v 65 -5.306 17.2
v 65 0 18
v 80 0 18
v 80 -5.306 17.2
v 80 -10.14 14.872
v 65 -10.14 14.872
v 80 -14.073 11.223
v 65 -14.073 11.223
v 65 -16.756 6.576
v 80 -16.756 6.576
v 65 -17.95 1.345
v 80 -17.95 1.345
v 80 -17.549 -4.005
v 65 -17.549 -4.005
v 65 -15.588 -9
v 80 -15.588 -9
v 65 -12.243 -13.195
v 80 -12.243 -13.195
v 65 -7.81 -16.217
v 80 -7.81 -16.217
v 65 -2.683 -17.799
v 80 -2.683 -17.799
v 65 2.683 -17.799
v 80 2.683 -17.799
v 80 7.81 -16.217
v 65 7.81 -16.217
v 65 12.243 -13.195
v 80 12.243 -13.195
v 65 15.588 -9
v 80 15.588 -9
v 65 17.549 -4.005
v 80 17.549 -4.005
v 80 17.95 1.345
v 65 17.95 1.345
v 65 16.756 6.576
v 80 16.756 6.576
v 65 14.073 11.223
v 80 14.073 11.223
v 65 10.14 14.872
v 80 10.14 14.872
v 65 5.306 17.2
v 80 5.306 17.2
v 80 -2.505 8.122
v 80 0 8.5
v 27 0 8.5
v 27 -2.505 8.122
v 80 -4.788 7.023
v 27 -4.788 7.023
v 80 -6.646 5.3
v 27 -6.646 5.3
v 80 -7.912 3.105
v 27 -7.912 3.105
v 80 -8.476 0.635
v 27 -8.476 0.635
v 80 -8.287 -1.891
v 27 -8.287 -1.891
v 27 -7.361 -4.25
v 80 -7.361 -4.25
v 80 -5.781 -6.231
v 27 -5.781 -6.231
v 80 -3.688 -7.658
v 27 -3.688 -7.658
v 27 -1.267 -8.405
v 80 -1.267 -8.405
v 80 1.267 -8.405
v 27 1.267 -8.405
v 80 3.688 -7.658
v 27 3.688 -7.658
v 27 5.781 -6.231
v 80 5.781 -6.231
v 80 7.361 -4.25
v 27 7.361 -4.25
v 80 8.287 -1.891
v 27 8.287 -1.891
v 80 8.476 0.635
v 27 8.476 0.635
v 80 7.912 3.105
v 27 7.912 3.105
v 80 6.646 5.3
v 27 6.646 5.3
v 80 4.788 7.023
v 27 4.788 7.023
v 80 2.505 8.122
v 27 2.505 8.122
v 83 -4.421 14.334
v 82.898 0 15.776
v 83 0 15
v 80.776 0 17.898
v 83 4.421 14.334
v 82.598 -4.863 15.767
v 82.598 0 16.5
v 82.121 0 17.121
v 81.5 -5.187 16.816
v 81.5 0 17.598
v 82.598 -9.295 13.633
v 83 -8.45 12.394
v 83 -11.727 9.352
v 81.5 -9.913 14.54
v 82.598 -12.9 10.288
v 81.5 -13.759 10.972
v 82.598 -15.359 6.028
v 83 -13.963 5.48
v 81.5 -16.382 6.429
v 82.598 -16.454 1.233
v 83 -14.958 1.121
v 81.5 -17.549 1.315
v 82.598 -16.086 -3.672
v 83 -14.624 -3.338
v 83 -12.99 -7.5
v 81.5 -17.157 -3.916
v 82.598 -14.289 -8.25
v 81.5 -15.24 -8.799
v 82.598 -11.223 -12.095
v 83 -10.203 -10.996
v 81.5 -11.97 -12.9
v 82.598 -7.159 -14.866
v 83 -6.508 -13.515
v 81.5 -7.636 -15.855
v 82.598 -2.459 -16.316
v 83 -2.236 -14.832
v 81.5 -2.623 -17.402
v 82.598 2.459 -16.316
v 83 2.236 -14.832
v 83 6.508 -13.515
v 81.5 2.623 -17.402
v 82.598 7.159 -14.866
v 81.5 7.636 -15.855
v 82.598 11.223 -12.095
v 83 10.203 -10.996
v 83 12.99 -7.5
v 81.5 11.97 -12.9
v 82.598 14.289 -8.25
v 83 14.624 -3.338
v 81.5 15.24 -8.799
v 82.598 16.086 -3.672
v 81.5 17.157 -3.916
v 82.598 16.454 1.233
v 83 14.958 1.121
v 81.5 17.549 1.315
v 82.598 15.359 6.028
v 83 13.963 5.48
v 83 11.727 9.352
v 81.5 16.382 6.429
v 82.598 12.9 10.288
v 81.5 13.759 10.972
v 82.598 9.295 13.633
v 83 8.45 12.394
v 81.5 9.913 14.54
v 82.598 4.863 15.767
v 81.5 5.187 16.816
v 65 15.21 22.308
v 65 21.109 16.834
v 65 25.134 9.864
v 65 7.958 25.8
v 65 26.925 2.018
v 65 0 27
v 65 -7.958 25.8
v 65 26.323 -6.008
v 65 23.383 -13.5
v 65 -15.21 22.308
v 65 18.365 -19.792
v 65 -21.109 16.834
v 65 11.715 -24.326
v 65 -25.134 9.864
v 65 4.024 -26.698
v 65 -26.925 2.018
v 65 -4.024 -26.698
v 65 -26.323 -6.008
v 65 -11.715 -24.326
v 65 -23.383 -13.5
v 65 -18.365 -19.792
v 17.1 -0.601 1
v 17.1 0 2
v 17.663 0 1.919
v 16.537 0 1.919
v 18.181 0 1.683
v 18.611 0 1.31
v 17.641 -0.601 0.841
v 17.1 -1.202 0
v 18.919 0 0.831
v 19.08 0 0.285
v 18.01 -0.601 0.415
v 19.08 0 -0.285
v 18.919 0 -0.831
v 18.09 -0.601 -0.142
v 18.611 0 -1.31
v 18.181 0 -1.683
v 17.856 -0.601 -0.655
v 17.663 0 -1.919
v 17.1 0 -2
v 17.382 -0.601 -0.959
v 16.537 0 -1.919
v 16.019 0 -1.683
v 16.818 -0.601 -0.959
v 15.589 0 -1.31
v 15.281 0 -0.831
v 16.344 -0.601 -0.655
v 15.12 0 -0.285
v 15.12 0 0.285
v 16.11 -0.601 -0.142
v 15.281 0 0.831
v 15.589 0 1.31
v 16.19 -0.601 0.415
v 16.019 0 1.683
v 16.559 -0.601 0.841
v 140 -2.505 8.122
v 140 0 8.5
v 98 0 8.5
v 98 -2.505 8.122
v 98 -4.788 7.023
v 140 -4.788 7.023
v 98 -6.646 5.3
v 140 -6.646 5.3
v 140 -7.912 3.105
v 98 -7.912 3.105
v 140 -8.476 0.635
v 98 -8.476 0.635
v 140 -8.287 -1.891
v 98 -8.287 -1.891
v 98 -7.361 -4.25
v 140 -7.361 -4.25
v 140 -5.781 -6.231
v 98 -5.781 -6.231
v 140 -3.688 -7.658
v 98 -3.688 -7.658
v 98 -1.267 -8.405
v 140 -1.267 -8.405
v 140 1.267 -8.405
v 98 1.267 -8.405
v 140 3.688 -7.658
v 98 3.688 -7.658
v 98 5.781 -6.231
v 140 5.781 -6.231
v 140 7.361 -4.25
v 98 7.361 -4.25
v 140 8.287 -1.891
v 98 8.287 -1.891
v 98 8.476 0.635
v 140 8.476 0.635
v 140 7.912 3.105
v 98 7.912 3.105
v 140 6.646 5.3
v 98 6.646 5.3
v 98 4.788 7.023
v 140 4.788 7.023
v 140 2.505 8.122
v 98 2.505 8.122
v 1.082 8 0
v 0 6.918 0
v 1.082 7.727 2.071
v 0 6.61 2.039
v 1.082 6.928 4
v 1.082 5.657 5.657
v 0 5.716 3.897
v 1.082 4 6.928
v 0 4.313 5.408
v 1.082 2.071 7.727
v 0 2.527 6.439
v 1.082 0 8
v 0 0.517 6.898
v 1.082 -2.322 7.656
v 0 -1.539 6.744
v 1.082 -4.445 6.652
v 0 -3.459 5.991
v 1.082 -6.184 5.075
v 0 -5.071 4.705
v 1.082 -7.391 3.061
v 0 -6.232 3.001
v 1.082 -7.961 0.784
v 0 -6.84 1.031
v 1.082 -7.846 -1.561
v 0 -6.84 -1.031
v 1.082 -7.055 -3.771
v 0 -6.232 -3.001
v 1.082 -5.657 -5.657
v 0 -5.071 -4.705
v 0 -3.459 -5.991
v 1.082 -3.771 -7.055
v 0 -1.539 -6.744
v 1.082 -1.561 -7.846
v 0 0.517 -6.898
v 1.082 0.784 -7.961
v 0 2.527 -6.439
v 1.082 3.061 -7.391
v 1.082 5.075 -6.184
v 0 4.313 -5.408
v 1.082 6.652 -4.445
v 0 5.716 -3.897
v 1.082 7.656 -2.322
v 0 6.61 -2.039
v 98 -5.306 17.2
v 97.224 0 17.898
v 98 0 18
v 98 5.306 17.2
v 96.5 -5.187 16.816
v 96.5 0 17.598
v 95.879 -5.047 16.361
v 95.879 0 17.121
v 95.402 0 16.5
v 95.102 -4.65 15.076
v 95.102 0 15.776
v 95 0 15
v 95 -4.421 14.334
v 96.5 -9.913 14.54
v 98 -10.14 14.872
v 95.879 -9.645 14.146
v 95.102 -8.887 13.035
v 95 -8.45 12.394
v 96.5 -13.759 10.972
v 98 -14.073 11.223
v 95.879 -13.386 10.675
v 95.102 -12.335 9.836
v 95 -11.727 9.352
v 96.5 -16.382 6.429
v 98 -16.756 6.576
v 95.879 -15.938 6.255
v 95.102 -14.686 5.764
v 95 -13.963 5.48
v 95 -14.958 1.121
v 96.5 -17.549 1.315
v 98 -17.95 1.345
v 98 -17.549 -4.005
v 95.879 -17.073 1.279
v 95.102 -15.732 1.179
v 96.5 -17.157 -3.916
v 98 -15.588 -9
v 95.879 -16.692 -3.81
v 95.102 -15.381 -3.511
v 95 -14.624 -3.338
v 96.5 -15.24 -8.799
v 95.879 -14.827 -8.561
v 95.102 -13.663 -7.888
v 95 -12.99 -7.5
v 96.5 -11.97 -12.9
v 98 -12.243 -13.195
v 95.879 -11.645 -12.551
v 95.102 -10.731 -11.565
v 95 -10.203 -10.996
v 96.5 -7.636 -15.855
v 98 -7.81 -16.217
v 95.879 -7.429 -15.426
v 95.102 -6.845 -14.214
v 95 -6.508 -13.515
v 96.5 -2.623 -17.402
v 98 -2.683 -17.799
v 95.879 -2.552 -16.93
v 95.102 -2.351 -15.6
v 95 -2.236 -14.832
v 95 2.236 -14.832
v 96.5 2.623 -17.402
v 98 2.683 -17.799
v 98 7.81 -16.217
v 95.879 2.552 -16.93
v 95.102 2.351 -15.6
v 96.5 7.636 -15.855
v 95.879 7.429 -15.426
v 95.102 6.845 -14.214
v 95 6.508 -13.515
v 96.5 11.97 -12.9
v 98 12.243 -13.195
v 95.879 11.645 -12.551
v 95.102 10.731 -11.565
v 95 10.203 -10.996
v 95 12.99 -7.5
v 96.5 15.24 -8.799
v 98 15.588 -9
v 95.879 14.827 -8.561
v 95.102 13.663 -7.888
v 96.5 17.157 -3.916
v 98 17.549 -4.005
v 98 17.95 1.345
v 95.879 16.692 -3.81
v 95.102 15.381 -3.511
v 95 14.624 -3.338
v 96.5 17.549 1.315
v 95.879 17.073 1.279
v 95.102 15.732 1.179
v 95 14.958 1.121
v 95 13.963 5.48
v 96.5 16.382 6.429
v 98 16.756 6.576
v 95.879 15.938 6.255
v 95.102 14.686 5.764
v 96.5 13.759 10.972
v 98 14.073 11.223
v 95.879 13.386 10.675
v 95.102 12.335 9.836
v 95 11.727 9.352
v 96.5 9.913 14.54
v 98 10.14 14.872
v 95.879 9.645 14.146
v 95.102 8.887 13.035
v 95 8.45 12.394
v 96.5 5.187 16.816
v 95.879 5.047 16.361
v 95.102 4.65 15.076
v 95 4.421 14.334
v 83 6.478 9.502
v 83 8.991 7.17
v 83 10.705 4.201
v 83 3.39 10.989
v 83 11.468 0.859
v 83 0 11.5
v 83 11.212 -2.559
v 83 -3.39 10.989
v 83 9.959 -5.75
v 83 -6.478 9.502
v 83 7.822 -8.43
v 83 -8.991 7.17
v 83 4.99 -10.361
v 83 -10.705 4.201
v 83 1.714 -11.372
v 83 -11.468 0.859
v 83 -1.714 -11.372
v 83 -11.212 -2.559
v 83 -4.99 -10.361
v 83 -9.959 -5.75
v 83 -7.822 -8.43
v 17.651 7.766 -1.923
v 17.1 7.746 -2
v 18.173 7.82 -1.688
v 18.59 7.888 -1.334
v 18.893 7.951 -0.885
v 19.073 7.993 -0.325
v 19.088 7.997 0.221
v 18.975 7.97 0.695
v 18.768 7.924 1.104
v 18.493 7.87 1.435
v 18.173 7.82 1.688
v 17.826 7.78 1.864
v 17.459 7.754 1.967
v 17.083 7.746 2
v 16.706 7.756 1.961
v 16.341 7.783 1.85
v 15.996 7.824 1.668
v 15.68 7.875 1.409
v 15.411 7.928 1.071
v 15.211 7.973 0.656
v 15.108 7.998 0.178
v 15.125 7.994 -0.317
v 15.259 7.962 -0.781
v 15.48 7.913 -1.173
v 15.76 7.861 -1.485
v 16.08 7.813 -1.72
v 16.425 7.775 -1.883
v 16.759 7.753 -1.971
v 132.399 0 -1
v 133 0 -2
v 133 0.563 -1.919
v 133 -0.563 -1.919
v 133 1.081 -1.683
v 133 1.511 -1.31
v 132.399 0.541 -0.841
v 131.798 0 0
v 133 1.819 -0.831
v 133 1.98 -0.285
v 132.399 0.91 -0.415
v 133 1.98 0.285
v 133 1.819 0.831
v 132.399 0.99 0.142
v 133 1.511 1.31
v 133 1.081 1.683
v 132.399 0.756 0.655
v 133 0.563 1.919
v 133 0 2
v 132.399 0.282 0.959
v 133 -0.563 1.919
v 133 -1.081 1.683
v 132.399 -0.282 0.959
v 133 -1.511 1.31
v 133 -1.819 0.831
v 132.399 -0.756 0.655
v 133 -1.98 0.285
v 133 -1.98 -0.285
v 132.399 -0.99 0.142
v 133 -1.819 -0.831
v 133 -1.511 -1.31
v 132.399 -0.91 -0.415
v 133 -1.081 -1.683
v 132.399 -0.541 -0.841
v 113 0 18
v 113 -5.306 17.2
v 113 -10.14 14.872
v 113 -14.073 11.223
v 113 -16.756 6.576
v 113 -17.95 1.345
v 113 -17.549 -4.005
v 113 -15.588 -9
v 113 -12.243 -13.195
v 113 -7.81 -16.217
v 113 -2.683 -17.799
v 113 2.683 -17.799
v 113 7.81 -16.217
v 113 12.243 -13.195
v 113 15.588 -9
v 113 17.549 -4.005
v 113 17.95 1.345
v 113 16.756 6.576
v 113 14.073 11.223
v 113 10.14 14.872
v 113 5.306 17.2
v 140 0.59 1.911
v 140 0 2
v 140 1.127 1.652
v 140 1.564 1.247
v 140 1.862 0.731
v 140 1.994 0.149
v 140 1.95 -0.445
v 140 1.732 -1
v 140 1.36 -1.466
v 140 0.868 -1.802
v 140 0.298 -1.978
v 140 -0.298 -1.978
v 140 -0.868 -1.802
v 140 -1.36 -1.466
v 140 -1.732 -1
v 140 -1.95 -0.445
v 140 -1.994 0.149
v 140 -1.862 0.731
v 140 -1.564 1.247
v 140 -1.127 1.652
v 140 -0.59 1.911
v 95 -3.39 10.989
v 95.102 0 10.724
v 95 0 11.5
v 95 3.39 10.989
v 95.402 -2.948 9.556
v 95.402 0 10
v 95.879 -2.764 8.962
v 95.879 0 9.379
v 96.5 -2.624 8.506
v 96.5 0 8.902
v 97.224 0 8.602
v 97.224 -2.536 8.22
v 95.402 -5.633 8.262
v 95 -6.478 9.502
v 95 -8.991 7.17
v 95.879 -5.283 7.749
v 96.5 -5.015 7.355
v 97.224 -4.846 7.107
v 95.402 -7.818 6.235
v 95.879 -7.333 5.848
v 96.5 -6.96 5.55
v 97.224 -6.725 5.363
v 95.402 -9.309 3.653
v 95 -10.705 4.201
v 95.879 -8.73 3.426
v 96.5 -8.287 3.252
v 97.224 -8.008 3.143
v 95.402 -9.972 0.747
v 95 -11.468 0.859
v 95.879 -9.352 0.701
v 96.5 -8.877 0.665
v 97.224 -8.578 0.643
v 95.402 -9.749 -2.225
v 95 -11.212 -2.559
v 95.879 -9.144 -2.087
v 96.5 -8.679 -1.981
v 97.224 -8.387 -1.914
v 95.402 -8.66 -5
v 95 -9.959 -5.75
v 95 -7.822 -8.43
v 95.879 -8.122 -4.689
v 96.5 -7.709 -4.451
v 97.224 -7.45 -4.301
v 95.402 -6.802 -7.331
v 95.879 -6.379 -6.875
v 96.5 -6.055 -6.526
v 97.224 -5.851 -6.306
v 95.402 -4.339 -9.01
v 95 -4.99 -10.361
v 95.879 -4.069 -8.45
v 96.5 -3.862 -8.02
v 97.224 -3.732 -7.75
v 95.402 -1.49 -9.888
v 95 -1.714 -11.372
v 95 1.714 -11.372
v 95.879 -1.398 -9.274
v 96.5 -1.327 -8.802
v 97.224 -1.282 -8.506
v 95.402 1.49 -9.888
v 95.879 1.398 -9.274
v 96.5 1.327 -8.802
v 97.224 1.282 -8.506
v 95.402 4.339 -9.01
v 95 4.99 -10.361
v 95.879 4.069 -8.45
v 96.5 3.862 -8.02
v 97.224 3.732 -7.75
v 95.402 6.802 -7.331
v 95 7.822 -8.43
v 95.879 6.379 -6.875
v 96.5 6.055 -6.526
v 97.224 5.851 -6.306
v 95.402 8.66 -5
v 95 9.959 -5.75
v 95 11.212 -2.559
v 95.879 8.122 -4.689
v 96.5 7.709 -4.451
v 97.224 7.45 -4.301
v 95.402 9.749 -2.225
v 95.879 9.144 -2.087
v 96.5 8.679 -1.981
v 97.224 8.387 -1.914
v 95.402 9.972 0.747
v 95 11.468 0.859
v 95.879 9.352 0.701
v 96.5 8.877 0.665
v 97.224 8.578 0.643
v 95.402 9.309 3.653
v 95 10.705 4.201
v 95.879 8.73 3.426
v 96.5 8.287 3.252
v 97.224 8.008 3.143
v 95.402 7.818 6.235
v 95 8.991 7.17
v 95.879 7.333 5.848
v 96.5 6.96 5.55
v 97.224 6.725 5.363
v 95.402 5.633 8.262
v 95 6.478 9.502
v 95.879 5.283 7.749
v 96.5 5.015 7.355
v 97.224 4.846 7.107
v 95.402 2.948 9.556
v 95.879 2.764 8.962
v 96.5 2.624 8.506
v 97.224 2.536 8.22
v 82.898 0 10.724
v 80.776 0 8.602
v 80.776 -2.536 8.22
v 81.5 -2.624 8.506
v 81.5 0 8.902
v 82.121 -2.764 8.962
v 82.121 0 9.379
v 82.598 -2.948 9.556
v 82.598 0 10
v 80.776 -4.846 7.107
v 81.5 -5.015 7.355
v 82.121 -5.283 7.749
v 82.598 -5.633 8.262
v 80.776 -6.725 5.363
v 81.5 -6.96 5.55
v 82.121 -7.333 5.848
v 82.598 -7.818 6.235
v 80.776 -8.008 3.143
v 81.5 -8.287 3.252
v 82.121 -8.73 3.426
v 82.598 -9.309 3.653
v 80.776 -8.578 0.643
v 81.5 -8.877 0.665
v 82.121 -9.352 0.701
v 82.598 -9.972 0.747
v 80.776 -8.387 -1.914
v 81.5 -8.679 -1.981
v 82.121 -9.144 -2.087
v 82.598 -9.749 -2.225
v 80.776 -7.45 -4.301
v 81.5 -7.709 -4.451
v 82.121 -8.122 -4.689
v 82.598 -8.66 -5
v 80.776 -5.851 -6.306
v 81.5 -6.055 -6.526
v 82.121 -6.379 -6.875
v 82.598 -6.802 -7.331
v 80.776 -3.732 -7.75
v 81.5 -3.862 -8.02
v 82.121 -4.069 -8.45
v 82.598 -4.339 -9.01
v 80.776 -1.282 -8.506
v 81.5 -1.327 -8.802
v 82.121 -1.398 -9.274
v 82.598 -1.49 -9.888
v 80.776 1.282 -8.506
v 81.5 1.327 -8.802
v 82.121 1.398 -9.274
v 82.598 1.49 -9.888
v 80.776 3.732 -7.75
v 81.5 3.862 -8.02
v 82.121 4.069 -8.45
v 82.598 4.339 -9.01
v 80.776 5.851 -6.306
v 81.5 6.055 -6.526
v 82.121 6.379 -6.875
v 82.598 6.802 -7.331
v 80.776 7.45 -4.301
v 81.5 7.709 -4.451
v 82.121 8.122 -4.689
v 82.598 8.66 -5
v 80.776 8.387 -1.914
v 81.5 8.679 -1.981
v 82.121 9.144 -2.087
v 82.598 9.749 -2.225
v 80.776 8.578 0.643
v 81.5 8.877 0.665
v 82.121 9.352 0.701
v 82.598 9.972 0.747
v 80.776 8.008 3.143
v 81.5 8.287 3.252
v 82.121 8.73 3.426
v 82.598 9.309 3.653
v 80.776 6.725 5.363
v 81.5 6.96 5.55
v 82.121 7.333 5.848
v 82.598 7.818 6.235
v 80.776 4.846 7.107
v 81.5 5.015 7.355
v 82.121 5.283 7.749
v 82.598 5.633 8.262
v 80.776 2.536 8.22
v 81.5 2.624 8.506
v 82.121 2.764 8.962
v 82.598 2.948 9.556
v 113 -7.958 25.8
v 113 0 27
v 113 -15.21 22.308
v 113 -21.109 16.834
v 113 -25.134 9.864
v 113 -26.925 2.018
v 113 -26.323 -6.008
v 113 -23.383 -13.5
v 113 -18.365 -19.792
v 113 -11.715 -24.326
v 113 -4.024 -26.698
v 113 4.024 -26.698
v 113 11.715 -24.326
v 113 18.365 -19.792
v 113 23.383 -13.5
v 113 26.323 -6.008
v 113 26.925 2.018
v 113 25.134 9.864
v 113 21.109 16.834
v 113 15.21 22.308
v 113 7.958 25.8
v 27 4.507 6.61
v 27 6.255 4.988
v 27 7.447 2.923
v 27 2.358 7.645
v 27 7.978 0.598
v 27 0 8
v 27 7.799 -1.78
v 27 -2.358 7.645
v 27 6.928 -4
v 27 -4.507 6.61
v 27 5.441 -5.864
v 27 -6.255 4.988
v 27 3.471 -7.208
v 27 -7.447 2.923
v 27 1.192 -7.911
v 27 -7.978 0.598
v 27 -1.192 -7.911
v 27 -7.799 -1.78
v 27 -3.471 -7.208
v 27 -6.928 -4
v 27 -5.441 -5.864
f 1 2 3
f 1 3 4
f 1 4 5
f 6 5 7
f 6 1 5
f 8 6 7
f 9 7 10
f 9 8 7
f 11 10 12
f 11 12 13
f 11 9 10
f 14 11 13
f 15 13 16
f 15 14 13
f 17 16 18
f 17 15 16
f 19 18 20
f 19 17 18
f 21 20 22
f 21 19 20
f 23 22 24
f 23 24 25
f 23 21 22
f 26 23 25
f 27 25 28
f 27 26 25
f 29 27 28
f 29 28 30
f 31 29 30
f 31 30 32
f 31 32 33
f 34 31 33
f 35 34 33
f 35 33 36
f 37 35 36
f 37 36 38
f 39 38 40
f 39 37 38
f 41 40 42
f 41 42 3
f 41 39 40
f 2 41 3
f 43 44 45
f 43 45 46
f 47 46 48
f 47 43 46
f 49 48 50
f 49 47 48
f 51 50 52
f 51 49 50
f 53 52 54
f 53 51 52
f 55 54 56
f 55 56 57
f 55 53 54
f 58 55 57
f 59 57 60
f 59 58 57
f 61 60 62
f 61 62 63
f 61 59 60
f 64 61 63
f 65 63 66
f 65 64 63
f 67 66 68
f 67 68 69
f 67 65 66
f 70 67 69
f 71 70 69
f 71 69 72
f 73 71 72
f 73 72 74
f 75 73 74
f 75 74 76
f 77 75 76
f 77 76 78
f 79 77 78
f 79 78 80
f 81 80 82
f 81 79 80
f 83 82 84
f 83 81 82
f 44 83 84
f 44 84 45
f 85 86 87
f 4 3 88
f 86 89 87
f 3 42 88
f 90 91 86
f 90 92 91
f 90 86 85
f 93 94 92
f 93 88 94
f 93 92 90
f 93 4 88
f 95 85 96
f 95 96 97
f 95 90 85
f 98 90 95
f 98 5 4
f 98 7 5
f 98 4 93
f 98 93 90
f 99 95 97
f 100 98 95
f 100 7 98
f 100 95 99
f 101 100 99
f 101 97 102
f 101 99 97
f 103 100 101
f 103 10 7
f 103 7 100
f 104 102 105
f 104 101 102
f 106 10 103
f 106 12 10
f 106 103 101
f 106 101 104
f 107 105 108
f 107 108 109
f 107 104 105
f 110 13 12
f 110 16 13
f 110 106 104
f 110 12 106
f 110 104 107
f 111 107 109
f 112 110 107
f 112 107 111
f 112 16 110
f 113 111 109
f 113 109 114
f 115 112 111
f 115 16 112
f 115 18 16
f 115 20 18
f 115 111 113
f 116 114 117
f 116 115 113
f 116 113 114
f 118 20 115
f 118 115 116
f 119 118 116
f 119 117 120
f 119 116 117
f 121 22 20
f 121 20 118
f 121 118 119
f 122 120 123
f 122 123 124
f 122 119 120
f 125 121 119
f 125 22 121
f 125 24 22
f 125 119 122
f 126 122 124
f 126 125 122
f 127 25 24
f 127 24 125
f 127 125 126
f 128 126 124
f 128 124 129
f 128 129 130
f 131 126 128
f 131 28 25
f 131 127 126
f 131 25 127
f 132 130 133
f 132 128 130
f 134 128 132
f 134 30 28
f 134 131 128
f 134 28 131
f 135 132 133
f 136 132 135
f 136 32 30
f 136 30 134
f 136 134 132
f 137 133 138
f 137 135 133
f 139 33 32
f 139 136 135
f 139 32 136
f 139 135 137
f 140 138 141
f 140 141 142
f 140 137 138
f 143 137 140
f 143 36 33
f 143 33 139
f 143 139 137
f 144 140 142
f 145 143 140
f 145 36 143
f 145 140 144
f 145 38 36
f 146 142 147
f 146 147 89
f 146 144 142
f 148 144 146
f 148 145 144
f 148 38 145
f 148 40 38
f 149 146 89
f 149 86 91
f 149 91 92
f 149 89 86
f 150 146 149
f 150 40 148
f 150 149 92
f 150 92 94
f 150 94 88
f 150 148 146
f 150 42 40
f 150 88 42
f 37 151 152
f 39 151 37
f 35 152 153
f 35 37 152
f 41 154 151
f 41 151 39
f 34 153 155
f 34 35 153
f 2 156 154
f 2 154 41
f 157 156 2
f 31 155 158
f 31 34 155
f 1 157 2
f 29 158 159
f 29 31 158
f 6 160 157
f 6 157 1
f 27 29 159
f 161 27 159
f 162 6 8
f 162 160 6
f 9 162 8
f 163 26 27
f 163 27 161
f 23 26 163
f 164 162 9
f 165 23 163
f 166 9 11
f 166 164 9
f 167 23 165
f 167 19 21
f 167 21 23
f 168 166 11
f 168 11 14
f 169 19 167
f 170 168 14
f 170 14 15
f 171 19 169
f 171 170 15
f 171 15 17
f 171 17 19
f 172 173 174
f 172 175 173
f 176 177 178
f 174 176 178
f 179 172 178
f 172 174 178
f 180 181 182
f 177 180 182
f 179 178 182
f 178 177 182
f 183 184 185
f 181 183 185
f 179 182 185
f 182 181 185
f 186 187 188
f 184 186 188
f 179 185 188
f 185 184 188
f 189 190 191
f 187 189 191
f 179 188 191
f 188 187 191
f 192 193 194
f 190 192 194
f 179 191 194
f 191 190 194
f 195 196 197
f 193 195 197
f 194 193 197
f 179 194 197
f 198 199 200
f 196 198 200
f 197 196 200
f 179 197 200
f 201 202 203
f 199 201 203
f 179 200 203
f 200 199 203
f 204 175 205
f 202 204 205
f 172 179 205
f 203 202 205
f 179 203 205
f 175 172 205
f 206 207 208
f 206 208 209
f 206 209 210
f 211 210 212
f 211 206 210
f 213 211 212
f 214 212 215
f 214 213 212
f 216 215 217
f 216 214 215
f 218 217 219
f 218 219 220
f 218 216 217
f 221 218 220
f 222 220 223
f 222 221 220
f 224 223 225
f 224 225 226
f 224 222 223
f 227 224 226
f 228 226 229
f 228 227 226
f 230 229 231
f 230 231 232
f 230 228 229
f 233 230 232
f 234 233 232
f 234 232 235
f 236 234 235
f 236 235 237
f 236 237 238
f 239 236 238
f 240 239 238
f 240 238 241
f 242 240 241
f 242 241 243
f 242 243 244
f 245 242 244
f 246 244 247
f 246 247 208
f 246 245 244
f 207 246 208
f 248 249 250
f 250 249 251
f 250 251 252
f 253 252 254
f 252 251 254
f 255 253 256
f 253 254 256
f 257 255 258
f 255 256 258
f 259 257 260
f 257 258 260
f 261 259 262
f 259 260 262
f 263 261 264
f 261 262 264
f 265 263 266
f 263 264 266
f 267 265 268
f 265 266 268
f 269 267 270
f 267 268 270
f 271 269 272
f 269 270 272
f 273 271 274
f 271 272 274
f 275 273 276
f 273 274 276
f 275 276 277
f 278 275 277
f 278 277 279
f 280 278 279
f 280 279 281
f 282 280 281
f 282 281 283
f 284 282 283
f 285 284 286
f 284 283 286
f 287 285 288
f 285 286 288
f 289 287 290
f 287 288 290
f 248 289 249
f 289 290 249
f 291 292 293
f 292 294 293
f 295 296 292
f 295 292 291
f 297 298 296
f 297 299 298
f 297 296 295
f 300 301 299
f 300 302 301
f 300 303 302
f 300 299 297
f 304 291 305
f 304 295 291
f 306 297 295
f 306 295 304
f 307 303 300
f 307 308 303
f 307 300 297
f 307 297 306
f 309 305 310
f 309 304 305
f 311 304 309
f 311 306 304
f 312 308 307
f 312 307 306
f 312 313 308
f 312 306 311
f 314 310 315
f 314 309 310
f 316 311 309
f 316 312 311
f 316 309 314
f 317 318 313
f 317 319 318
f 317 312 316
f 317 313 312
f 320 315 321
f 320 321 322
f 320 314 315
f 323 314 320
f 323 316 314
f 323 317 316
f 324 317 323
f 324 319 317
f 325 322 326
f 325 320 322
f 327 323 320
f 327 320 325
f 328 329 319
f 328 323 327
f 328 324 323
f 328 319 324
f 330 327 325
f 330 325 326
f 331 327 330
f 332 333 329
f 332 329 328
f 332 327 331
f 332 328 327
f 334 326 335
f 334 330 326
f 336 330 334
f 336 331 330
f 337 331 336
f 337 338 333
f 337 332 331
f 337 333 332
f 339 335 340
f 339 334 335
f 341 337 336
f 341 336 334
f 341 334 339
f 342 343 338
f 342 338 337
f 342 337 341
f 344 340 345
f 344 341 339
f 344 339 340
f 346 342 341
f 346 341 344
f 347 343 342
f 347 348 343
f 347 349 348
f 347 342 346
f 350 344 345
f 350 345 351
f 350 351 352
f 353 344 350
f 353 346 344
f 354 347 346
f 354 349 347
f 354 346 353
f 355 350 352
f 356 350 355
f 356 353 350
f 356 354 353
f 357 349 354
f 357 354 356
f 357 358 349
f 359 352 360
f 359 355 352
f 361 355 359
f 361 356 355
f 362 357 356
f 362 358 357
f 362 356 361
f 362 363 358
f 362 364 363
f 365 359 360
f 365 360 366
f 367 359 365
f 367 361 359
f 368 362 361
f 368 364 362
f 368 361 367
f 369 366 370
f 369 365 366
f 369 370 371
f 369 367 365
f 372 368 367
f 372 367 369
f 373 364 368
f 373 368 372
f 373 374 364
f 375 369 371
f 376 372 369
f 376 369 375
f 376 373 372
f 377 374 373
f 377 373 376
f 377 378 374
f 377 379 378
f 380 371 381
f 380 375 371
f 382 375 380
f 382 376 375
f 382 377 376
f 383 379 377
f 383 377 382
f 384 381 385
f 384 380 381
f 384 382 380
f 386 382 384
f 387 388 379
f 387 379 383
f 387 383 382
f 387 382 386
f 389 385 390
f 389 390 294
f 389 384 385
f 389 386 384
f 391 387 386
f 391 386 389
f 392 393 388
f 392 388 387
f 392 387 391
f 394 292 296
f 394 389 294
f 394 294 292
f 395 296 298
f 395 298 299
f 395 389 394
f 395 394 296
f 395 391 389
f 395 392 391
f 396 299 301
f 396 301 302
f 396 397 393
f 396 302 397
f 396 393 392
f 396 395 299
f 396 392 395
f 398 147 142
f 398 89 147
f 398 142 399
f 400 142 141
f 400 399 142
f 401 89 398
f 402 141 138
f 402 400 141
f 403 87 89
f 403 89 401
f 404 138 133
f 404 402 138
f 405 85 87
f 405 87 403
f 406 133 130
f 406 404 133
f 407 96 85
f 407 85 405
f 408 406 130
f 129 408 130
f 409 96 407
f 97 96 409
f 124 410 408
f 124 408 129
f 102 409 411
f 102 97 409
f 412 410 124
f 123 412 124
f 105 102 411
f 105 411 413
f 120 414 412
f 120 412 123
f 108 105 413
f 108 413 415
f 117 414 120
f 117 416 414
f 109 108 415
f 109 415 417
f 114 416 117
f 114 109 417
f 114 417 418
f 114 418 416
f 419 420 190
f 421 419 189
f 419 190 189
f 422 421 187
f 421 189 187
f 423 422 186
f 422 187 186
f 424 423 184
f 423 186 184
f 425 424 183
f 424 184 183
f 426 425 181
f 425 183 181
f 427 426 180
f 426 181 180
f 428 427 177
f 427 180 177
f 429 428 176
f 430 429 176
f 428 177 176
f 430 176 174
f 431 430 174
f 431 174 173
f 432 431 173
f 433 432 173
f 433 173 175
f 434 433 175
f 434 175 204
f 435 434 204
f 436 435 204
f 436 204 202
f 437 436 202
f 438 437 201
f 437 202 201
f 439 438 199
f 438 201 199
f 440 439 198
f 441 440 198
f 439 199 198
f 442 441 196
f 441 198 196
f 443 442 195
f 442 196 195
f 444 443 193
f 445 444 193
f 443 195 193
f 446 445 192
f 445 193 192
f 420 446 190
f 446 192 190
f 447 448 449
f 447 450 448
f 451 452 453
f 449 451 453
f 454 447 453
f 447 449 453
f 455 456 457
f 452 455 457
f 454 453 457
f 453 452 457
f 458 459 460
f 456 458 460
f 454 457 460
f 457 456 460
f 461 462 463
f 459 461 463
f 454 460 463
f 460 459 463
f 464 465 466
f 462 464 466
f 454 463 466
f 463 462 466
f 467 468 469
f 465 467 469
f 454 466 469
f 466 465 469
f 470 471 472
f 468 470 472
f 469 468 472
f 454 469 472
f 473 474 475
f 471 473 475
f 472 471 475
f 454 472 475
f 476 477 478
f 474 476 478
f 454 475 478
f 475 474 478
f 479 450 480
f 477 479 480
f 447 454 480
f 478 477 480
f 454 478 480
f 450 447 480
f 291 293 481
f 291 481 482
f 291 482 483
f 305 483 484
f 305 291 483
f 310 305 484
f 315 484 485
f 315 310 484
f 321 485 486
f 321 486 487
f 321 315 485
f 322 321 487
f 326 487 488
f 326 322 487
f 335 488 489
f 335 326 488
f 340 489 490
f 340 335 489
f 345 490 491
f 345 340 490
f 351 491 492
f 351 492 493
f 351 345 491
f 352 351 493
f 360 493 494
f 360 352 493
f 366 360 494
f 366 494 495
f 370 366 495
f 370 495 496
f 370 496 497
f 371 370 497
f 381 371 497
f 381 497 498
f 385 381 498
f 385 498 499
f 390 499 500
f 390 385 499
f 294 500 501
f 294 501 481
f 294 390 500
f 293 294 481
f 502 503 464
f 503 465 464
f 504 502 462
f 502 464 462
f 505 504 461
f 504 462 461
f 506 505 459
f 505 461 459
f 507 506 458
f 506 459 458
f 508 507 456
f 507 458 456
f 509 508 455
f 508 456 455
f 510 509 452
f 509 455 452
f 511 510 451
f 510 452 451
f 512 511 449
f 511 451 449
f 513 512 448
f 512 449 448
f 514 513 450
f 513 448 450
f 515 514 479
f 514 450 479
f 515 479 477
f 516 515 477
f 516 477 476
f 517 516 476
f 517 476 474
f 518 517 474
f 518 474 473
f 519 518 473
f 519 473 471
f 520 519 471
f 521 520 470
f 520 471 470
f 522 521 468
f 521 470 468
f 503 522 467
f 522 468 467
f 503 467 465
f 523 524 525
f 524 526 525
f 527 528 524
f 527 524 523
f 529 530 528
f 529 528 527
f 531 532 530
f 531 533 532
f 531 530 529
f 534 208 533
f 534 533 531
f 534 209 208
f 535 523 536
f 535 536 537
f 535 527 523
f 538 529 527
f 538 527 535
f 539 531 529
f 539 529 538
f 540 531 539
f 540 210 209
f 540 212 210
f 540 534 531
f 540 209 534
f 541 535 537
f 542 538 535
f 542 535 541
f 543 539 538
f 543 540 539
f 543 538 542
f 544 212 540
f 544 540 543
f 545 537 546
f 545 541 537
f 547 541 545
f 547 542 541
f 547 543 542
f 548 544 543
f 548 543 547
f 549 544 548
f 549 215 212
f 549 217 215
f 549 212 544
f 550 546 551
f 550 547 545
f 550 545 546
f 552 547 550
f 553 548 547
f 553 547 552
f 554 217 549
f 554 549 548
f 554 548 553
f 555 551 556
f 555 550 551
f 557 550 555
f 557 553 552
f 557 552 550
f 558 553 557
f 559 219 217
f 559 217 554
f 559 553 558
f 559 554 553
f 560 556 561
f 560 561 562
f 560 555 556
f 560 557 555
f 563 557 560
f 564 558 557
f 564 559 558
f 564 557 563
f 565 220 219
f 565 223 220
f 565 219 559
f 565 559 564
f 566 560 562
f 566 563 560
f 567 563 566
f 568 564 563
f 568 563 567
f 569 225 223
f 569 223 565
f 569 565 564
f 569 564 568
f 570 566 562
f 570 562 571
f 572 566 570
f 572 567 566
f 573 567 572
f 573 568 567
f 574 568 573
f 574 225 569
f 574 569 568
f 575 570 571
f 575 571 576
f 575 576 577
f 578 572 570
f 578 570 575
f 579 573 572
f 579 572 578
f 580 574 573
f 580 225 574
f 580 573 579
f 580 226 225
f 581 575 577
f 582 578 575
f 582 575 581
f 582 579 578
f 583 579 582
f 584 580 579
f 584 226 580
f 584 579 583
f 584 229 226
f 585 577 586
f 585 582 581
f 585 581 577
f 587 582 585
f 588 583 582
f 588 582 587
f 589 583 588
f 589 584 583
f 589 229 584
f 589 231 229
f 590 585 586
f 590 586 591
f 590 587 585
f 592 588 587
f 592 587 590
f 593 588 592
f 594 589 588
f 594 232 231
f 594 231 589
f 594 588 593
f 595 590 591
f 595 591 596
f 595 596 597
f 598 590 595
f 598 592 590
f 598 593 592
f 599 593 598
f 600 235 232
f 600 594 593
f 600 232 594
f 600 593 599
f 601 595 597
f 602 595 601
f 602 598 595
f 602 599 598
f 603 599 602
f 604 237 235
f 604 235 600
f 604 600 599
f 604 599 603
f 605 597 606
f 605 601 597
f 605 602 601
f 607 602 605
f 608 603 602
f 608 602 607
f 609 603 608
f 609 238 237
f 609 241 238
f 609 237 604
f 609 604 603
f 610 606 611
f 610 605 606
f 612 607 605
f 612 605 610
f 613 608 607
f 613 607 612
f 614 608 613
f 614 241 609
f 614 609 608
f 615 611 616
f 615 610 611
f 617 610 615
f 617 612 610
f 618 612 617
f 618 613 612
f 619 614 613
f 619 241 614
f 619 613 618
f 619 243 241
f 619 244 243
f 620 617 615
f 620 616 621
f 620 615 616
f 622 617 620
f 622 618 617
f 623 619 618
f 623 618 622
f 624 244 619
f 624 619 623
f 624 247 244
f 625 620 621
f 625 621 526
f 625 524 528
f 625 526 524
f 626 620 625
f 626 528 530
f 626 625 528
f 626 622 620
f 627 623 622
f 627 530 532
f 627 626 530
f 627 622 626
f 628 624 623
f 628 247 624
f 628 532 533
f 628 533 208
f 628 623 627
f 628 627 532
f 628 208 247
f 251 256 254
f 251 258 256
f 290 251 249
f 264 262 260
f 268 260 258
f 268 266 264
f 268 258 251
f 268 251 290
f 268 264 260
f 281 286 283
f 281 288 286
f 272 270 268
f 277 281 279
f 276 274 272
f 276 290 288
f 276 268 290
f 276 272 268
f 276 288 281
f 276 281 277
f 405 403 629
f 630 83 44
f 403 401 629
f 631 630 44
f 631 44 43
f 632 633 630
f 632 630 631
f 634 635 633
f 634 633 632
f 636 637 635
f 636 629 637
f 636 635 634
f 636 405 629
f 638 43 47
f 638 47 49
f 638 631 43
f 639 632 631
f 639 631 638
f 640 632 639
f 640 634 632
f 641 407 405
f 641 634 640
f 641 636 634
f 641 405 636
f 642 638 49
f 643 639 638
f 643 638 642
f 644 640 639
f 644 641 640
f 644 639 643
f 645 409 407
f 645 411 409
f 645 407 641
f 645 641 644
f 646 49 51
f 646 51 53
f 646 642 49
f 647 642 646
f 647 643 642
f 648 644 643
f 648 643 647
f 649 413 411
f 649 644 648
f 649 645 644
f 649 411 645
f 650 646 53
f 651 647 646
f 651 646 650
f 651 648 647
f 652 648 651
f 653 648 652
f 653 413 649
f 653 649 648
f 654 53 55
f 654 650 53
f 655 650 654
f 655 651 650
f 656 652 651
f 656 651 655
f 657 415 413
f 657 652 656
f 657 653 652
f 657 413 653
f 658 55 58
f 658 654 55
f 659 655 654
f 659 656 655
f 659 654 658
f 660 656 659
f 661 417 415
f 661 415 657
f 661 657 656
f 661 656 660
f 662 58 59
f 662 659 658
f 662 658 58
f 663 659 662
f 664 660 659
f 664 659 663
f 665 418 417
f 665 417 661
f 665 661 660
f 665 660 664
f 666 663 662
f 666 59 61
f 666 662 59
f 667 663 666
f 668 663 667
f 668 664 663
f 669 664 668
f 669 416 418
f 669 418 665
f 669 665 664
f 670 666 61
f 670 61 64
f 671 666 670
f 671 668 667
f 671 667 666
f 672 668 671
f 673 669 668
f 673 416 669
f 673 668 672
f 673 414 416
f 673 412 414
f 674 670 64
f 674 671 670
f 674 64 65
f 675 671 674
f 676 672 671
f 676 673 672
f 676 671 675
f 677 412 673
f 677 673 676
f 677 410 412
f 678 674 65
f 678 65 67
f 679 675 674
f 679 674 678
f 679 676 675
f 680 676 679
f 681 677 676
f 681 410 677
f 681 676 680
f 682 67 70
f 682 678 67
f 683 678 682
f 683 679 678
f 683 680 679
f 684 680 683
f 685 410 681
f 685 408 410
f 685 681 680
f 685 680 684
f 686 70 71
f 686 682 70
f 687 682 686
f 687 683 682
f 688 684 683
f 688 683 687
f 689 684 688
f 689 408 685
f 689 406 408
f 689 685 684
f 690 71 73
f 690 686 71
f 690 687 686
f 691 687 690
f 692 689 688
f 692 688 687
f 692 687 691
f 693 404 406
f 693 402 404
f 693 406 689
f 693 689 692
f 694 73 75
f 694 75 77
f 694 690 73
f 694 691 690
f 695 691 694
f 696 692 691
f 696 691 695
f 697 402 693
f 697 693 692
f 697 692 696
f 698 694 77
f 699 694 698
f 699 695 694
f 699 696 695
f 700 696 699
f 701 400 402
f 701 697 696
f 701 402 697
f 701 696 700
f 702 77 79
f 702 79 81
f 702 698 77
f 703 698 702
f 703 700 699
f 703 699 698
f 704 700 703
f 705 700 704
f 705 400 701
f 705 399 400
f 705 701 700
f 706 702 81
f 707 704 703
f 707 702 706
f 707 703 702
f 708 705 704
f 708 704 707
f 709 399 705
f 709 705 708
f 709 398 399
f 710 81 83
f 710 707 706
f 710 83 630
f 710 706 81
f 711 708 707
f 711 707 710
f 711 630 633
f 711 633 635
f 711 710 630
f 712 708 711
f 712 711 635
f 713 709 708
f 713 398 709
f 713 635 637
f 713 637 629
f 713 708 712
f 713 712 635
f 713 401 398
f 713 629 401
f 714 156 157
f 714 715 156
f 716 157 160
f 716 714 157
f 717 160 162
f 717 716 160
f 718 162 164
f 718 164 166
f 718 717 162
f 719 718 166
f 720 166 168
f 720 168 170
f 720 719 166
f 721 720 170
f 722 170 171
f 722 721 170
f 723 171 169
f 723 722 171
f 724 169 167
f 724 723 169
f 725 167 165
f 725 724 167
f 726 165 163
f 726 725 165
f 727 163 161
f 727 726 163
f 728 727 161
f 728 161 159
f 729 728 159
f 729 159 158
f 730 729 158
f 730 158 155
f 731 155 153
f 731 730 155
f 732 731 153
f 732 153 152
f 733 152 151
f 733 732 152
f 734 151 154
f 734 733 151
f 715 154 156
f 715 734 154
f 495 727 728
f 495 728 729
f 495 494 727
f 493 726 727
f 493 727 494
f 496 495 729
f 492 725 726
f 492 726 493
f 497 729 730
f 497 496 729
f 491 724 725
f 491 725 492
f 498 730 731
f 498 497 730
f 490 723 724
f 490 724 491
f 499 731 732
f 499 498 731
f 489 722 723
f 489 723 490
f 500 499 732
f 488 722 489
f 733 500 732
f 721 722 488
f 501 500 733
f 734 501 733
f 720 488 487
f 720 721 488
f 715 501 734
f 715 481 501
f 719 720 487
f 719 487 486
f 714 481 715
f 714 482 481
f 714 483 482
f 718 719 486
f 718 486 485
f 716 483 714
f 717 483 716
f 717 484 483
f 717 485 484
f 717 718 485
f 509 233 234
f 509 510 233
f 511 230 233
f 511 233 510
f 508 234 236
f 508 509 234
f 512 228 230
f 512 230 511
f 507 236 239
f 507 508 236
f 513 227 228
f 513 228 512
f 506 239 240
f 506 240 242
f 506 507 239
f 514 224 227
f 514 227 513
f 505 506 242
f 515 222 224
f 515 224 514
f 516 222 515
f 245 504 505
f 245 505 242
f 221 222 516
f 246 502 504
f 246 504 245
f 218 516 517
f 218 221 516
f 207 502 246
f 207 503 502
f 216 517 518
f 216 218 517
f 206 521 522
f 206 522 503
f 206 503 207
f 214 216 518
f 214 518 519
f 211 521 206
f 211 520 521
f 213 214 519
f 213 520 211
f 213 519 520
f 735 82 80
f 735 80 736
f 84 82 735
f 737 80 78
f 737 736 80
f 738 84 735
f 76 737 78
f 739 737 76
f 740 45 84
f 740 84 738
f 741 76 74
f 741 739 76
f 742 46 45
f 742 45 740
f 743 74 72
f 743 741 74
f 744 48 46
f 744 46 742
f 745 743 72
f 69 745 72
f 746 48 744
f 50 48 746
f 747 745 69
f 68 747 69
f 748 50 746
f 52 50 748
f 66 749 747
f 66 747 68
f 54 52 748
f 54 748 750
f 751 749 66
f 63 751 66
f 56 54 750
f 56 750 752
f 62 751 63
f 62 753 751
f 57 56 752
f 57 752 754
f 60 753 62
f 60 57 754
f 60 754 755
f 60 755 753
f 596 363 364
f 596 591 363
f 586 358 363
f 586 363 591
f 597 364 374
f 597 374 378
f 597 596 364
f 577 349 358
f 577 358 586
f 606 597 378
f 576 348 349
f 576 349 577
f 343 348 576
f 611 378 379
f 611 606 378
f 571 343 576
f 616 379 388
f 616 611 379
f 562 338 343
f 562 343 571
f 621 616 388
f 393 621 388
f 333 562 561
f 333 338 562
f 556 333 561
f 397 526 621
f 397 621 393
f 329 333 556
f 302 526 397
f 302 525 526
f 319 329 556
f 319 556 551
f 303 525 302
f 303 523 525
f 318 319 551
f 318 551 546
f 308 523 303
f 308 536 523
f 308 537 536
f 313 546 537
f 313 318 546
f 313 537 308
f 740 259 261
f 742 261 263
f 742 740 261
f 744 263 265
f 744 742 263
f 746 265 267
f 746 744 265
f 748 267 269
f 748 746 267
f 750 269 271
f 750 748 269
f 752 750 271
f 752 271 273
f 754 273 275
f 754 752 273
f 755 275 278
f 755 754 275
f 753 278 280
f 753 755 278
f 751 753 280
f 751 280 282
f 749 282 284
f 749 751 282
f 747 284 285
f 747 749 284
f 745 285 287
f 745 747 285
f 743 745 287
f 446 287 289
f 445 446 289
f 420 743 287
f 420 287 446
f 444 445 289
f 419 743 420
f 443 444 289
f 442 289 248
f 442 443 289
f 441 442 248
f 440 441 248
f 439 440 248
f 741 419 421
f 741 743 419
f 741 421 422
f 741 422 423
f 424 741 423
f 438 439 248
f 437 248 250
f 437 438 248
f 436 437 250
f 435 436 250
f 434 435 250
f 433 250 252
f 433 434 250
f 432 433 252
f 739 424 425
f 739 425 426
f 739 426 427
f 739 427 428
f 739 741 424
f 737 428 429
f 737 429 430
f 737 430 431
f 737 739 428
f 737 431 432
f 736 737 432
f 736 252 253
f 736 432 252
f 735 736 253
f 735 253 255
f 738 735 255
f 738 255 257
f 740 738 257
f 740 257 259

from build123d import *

# Parameters (mm, degrees)
FILLET_4_R      = 3
F_4_0MM_4_D     = 4
F_4_0MM_4_DEPTH = 8
F_4_0MM_4_TIP   = 1.201721238
F_4_0MM_5_D     = 4
F_4_0MM_5_DEPTH = 7
F_4_0MM_5_TIP   = 1.201721238


# Read off the part's stored shape, not the designer's step: M16 机械螺纹 螺柱1
with BuildPart() as part:
    # 草图1 → 旋转1 (revolve)
    with BuildSketch(Plane.XY, mode=Mode.PRIVATE) as revolve_1_sk:
        Polygon((0, 0), (0, 8), (27, 8), (27, 8.5), (83, 8.5), (83, 18), (65, 18), (65, 27), (113, 27), (113, 18), (95, 18), (95, 8.5), (140, 8.5), (140, 0), align=None)
    revolve(revolve_1_sk.sketch.rotate(Axis((0, 0, 0), (1, 0, 0)), 90), axis=Axis((0, 0, 0), (1, 0, 0)))

    # 圆角4
    fillet_4_edges = [part.edges().sort_by_distance(p)[0] for p in [
        (95, 0, -8.5),
        (95, 0, -18),
        (83, 0, -18),
        (83, 0, -8.5),
    ]]
    fillet(fillet_4_edges, radius=FILLET_4_R)

    # M16 机械螺纹 螺柱1 outline → M16 机械螺纹 螺柱1 (revolve, cut)
    with BuildSketch(Plane.YX):
        Polygon((8, 1.0825), (6.9175, 0), (8, 0), align=None)
    revolve(axis=Axis((0, 0, 0), (1, 0, 0)), mode=Mode.SUBTRACT)

    # Ø4.0mm 暗销孔4
    with Locations(Plane(origin=(17.1, 8, 0), x_dir=(0, 0, 1), z_dir=(0, 1, 0))):
        with Locations((0, 0)):
            Hole(F_4_0MM_4_D / 2, depth=F_4_0MM_4_DEPTH)
            with Locations((0, 0, -(F_4_0MM_4_DEPTH + F_4_0MM_4_TIP / 2))):  # 118° drill point
                Cone(0, F_4_0MM_4_D / 2, F_4_0MM_4_TIP, mode=Mode.SUBTRACT)

    # Ø4.0mm 暗销孔5
    with Locations(Plane(origin=(140, 0, 0), x_dir=(0, 0, -1), z_dir=(1, 0, 0))):
        with Locations((0, 0)):
            Hole(F_4_0MM_5_D / 2, depth=F_4_0MM_5_DEPTH)
            with Locations((0, 0, -(F_4_0MM_5_DEPTH + F_4_0MM_5_TIP / 2))):  # 118° drill point
                Cone(0, F_4_0MM_5_D / 2, F_4_0MM_5_TIP, mode=Mode.SUBTRACT)


solid = part.part
